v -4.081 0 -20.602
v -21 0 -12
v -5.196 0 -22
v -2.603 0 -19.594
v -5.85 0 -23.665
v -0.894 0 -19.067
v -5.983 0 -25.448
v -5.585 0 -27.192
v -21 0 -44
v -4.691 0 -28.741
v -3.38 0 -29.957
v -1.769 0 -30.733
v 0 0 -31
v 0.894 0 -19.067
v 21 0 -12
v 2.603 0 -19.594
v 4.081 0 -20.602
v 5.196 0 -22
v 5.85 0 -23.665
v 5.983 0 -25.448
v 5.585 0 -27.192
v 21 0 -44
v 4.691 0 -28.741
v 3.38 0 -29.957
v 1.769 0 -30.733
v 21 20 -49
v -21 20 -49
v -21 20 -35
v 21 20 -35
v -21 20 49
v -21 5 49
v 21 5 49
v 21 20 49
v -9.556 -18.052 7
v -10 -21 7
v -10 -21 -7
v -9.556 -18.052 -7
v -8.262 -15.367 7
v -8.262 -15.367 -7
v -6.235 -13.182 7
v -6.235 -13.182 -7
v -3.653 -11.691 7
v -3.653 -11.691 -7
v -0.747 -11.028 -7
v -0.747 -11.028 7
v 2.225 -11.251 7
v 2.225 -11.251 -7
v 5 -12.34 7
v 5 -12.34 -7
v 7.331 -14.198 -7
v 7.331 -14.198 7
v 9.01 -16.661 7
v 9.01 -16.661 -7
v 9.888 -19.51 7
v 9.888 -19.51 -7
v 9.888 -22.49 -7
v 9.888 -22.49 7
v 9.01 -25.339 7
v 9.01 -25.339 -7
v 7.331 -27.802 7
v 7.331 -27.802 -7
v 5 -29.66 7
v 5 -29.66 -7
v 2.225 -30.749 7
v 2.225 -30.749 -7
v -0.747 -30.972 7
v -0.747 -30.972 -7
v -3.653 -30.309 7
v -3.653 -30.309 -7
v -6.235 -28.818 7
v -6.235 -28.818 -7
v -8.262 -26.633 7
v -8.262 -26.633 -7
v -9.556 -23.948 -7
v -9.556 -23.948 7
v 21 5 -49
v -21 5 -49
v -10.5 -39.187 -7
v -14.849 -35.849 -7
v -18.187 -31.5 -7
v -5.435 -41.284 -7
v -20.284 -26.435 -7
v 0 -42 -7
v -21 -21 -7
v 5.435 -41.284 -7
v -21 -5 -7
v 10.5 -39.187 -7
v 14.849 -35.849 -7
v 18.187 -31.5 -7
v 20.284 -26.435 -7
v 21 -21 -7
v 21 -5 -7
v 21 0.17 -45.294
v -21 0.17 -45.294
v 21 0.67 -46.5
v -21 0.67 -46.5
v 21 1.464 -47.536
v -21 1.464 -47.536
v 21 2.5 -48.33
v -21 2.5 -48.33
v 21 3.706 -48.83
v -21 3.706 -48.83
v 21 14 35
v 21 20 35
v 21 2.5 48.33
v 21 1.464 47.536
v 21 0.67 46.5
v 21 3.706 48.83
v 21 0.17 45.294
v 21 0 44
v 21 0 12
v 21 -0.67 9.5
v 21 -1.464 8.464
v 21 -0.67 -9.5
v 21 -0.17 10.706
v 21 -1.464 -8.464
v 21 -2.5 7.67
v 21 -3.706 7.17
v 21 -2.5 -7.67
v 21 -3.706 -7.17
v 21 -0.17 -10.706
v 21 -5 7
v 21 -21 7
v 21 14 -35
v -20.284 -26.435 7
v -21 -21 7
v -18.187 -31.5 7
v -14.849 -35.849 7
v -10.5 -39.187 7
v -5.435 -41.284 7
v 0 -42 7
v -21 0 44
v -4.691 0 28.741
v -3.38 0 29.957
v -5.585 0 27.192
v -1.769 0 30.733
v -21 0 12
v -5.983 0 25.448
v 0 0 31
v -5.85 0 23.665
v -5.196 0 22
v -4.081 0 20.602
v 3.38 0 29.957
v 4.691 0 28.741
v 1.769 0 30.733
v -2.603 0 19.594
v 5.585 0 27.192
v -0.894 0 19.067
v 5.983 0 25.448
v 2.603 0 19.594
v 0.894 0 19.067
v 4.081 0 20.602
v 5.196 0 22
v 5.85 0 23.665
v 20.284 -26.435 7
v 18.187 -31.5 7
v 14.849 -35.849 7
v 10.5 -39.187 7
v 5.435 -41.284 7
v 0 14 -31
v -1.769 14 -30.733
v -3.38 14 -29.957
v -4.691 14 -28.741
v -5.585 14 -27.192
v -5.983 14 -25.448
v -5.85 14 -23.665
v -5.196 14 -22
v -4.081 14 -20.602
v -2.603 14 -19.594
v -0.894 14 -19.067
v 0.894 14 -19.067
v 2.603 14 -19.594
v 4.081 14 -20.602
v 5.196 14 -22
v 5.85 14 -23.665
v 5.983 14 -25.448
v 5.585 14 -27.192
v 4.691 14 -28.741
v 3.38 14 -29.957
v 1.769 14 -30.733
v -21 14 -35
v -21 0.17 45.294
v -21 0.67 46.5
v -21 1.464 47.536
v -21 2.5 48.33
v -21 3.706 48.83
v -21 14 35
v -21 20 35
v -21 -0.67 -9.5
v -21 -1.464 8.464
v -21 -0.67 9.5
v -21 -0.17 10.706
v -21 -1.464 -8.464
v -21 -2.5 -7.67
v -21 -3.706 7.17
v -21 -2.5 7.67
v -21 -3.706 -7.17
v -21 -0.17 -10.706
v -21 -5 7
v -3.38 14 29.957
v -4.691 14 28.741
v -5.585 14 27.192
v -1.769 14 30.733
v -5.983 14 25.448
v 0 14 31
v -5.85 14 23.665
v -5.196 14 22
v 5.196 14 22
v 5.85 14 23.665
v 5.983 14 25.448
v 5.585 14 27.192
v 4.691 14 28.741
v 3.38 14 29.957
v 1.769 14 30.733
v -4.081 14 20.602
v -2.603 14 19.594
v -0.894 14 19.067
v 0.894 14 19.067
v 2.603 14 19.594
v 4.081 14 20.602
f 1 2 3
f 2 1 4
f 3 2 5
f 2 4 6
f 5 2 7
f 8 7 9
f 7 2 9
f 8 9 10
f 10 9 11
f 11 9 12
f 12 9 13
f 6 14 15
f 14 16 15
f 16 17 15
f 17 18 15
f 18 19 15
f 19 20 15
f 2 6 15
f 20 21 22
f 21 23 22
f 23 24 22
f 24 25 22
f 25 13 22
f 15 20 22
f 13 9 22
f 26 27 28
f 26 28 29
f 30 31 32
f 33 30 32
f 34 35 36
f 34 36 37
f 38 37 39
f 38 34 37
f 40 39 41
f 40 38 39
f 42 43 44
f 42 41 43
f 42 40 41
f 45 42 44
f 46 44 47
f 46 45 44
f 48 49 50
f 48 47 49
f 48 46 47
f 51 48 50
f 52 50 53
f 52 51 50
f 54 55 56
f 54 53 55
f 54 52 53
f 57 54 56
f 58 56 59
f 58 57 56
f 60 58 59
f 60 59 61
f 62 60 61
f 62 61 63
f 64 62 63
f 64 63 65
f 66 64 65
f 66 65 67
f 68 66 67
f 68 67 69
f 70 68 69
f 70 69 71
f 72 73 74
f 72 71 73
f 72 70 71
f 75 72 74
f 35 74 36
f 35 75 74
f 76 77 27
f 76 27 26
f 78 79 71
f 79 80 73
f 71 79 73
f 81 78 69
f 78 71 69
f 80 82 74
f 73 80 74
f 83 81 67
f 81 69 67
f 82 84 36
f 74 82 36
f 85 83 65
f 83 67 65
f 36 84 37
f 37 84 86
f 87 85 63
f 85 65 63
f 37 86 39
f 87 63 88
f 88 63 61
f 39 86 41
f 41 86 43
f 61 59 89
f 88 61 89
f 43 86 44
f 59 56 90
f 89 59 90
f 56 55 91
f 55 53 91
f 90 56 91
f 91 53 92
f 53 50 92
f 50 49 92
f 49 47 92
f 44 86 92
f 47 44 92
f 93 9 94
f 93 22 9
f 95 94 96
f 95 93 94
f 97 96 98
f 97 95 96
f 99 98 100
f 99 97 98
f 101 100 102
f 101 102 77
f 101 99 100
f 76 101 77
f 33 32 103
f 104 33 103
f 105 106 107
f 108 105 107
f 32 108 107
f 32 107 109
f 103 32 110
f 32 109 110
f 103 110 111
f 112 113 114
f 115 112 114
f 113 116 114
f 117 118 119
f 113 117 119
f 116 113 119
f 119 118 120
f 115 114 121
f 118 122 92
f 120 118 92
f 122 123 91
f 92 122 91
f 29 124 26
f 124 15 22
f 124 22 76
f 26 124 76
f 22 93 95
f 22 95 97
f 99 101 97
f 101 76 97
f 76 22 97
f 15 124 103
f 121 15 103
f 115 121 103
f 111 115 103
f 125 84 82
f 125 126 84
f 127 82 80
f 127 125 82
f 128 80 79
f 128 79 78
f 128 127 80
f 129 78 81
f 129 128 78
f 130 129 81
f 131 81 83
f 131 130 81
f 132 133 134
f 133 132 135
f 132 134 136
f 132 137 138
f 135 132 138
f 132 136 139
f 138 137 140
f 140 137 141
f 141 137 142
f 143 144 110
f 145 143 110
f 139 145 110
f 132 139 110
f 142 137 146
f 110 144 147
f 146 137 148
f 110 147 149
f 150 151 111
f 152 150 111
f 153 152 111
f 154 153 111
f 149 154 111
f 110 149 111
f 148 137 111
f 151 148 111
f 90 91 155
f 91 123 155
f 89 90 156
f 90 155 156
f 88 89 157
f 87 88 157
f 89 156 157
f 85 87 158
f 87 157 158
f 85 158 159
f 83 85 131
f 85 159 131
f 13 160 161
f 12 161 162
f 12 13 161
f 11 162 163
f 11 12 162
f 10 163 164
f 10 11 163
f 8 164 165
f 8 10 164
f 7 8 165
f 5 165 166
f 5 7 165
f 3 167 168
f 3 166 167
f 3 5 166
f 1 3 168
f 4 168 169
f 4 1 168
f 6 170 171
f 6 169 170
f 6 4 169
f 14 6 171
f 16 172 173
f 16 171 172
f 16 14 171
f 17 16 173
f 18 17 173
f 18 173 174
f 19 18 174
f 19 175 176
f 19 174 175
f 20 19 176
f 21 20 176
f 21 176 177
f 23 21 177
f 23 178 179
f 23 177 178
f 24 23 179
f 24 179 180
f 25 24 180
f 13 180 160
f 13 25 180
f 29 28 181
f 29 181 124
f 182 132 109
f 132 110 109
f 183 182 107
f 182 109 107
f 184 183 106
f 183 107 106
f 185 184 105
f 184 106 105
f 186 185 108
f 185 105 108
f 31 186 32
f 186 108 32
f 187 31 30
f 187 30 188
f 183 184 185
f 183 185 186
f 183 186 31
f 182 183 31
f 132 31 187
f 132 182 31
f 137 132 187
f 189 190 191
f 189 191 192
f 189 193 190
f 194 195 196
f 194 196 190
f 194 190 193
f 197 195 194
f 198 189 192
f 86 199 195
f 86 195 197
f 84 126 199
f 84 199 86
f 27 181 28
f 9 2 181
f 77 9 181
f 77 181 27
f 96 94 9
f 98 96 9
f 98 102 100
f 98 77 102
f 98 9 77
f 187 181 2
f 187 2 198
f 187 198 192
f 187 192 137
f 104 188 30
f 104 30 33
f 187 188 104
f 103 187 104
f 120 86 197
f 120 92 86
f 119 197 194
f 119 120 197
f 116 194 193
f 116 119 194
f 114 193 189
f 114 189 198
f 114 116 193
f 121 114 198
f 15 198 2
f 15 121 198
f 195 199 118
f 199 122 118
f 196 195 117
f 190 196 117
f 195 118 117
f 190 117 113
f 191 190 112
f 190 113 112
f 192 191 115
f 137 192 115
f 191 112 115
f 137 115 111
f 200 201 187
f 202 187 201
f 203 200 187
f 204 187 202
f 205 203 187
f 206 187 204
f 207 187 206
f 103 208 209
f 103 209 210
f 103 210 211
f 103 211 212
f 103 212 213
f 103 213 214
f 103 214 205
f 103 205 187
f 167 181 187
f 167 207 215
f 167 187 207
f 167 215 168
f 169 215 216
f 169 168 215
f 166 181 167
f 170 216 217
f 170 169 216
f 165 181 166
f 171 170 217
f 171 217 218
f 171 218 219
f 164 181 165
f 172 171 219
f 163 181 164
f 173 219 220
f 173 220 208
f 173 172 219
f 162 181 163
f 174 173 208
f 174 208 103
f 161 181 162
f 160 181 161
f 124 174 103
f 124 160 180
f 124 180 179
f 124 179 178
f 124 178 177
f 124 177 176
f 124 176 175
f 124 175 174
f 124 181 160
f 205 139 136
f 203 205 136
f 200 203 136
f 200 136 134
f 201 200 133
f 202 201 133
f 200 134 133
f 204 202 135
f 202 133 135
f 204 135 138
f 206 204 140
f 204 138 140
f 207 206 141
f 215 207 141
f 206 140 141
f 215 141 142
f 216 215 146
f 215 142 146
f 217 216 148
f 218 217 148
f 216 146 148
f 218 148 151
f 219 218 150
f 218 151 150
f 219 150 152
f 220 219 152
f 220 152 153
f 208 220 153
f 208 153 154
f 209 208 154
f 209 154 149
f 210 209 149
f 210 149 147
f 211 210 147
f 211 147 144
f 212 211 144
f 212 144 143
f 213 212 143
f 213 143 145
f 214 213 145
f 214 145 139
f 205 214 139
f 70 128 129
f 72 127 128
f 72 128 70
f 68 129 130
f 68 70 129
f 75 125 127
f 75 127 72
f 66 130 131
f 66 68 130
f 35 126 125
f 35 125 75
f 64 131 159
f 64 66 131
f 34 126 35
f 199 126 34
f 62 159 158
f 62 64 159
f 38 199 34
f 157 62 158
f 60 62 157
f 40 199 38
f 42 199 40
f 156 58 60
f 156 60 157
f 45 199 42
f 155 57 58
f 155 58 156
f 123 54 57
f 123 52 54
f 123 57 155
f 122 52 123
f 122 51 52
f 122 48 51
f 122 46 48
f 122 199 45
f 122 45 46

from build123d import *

# Parameters (mm, degrees)
SKETCH1_W               = 42
SKETCH1_H               = 98
BOSS_EXTRUDE1_DEPTH     = 20
SKETCH2_W               = 42
SKETCH2_H               = 70
CUT_EXTRUDE1_DEPTH      = 6
SKETCH3_W               = 42
SKETCH3_H               = 14
BOSS_EXTRUDE2_DEPTH     = 42
FILLET1_R               = 21
CUT_EXTRUDE2_DEPTH      = 74.082145562
CUT_EXTRUDE2_DEPTH_BACK = 74.082145562
SKETCH4_R               = 10
SKETCH6_R               = 6
CUT_EXTRUDE3_DEPTH      = 42
FILLET2_R               = 5


with BuildPart() as part:
    # Sketch1 → Boss-Extrude1 (new body)
    with BuildSketch(Plane(origin=(0, 0, 0), x_dir=(1, 0, 0), z_dir=(0, 1, 0))):
        Rectangle(SKETCH1_W, SKETCH1_H)
    extrude(amount=BOSS_EXTRUDE1_DEPTH)

    # Sketch2 → Cut-Extrude1 (cut)
    with BuildSketch(Plane(origin=(0, 20, 0), x_dir=(1, 0, 0), z_dir=(0, 1, 0))):
        Rectangle(SKETCH2_W, SKETCH2_H)
    extrude(amount=-CUT_EXTRUDE1_DEPTH, mode=Mode.SUBTRACT)

    # Sketch3 → Boss-Extrude2 (add)
    with BuildSketch(Plane.XZ):
        Rectangle(SKETCH3_W, SKETCH3_H)
    extrude(amount=BOSS_EXTRUDE2_DEPTH)

    # Fillet1
    fillet1_edges = [part.edges().sort_by_distance(p)[0] for p in [
        (21, -42, 0),
        (-21, -42, 0),
    ]]
    fillet(fillet1_edges, radius=FILLET1_R - 0.0001)  # a hair under: the kernel refuses the full size

    # Sketch4 → Cut-Extrude2 (cut, two sides: drawn at the far end of the back side and taken through both)
    with BuildSketch(Plane(origin=(0, 0, -7), x_dir=(-1, 0, 0), z_dir=(0, 0, -1)).offset(-CUT_EXTRUDE2_DEPTH_BACK)):
        with Locations((0, -21)):
            Circle(SKETCH4_R)
    extrude(amount=CUT_EXTRUDE2_DEPTH + CUT_EXTRUDE2_DEPTH_BACK, mode=Mode.SUBTRACT)

    # Sketch6 → Cut-Extrude3 (cut)
    with BuildSketch(Plane(origin=(0, 0, 0), x_dir=(1, 0, 0), z_dir=(0, 1, 0))):
        with Locations(Location((0, 25, 0), (0, 0, 90))):
            Circle(SKETCH6_R)
    cut_extrude3 = extrude(amount=CUT_EXTRUDE3_DEPTH, mode=Mode.SUBTRACT)

    # Mirror1: Cut-Extrude3 across plane
    add(cut_extrude3.mirror(Plane.XY), mode=Mode.SUBTRACT)

    # Fillet2
    fillet2_edges = [part.edges().sort_by_distance(p)[0] for p in [
        (0, 0, -7),
        (0, 0, 7),
        (0, 0, -49),
        (0, 0, 49),
    ]]
    fillet(fillet2_edges, radius=FILLET2_R)


solid = part.part
